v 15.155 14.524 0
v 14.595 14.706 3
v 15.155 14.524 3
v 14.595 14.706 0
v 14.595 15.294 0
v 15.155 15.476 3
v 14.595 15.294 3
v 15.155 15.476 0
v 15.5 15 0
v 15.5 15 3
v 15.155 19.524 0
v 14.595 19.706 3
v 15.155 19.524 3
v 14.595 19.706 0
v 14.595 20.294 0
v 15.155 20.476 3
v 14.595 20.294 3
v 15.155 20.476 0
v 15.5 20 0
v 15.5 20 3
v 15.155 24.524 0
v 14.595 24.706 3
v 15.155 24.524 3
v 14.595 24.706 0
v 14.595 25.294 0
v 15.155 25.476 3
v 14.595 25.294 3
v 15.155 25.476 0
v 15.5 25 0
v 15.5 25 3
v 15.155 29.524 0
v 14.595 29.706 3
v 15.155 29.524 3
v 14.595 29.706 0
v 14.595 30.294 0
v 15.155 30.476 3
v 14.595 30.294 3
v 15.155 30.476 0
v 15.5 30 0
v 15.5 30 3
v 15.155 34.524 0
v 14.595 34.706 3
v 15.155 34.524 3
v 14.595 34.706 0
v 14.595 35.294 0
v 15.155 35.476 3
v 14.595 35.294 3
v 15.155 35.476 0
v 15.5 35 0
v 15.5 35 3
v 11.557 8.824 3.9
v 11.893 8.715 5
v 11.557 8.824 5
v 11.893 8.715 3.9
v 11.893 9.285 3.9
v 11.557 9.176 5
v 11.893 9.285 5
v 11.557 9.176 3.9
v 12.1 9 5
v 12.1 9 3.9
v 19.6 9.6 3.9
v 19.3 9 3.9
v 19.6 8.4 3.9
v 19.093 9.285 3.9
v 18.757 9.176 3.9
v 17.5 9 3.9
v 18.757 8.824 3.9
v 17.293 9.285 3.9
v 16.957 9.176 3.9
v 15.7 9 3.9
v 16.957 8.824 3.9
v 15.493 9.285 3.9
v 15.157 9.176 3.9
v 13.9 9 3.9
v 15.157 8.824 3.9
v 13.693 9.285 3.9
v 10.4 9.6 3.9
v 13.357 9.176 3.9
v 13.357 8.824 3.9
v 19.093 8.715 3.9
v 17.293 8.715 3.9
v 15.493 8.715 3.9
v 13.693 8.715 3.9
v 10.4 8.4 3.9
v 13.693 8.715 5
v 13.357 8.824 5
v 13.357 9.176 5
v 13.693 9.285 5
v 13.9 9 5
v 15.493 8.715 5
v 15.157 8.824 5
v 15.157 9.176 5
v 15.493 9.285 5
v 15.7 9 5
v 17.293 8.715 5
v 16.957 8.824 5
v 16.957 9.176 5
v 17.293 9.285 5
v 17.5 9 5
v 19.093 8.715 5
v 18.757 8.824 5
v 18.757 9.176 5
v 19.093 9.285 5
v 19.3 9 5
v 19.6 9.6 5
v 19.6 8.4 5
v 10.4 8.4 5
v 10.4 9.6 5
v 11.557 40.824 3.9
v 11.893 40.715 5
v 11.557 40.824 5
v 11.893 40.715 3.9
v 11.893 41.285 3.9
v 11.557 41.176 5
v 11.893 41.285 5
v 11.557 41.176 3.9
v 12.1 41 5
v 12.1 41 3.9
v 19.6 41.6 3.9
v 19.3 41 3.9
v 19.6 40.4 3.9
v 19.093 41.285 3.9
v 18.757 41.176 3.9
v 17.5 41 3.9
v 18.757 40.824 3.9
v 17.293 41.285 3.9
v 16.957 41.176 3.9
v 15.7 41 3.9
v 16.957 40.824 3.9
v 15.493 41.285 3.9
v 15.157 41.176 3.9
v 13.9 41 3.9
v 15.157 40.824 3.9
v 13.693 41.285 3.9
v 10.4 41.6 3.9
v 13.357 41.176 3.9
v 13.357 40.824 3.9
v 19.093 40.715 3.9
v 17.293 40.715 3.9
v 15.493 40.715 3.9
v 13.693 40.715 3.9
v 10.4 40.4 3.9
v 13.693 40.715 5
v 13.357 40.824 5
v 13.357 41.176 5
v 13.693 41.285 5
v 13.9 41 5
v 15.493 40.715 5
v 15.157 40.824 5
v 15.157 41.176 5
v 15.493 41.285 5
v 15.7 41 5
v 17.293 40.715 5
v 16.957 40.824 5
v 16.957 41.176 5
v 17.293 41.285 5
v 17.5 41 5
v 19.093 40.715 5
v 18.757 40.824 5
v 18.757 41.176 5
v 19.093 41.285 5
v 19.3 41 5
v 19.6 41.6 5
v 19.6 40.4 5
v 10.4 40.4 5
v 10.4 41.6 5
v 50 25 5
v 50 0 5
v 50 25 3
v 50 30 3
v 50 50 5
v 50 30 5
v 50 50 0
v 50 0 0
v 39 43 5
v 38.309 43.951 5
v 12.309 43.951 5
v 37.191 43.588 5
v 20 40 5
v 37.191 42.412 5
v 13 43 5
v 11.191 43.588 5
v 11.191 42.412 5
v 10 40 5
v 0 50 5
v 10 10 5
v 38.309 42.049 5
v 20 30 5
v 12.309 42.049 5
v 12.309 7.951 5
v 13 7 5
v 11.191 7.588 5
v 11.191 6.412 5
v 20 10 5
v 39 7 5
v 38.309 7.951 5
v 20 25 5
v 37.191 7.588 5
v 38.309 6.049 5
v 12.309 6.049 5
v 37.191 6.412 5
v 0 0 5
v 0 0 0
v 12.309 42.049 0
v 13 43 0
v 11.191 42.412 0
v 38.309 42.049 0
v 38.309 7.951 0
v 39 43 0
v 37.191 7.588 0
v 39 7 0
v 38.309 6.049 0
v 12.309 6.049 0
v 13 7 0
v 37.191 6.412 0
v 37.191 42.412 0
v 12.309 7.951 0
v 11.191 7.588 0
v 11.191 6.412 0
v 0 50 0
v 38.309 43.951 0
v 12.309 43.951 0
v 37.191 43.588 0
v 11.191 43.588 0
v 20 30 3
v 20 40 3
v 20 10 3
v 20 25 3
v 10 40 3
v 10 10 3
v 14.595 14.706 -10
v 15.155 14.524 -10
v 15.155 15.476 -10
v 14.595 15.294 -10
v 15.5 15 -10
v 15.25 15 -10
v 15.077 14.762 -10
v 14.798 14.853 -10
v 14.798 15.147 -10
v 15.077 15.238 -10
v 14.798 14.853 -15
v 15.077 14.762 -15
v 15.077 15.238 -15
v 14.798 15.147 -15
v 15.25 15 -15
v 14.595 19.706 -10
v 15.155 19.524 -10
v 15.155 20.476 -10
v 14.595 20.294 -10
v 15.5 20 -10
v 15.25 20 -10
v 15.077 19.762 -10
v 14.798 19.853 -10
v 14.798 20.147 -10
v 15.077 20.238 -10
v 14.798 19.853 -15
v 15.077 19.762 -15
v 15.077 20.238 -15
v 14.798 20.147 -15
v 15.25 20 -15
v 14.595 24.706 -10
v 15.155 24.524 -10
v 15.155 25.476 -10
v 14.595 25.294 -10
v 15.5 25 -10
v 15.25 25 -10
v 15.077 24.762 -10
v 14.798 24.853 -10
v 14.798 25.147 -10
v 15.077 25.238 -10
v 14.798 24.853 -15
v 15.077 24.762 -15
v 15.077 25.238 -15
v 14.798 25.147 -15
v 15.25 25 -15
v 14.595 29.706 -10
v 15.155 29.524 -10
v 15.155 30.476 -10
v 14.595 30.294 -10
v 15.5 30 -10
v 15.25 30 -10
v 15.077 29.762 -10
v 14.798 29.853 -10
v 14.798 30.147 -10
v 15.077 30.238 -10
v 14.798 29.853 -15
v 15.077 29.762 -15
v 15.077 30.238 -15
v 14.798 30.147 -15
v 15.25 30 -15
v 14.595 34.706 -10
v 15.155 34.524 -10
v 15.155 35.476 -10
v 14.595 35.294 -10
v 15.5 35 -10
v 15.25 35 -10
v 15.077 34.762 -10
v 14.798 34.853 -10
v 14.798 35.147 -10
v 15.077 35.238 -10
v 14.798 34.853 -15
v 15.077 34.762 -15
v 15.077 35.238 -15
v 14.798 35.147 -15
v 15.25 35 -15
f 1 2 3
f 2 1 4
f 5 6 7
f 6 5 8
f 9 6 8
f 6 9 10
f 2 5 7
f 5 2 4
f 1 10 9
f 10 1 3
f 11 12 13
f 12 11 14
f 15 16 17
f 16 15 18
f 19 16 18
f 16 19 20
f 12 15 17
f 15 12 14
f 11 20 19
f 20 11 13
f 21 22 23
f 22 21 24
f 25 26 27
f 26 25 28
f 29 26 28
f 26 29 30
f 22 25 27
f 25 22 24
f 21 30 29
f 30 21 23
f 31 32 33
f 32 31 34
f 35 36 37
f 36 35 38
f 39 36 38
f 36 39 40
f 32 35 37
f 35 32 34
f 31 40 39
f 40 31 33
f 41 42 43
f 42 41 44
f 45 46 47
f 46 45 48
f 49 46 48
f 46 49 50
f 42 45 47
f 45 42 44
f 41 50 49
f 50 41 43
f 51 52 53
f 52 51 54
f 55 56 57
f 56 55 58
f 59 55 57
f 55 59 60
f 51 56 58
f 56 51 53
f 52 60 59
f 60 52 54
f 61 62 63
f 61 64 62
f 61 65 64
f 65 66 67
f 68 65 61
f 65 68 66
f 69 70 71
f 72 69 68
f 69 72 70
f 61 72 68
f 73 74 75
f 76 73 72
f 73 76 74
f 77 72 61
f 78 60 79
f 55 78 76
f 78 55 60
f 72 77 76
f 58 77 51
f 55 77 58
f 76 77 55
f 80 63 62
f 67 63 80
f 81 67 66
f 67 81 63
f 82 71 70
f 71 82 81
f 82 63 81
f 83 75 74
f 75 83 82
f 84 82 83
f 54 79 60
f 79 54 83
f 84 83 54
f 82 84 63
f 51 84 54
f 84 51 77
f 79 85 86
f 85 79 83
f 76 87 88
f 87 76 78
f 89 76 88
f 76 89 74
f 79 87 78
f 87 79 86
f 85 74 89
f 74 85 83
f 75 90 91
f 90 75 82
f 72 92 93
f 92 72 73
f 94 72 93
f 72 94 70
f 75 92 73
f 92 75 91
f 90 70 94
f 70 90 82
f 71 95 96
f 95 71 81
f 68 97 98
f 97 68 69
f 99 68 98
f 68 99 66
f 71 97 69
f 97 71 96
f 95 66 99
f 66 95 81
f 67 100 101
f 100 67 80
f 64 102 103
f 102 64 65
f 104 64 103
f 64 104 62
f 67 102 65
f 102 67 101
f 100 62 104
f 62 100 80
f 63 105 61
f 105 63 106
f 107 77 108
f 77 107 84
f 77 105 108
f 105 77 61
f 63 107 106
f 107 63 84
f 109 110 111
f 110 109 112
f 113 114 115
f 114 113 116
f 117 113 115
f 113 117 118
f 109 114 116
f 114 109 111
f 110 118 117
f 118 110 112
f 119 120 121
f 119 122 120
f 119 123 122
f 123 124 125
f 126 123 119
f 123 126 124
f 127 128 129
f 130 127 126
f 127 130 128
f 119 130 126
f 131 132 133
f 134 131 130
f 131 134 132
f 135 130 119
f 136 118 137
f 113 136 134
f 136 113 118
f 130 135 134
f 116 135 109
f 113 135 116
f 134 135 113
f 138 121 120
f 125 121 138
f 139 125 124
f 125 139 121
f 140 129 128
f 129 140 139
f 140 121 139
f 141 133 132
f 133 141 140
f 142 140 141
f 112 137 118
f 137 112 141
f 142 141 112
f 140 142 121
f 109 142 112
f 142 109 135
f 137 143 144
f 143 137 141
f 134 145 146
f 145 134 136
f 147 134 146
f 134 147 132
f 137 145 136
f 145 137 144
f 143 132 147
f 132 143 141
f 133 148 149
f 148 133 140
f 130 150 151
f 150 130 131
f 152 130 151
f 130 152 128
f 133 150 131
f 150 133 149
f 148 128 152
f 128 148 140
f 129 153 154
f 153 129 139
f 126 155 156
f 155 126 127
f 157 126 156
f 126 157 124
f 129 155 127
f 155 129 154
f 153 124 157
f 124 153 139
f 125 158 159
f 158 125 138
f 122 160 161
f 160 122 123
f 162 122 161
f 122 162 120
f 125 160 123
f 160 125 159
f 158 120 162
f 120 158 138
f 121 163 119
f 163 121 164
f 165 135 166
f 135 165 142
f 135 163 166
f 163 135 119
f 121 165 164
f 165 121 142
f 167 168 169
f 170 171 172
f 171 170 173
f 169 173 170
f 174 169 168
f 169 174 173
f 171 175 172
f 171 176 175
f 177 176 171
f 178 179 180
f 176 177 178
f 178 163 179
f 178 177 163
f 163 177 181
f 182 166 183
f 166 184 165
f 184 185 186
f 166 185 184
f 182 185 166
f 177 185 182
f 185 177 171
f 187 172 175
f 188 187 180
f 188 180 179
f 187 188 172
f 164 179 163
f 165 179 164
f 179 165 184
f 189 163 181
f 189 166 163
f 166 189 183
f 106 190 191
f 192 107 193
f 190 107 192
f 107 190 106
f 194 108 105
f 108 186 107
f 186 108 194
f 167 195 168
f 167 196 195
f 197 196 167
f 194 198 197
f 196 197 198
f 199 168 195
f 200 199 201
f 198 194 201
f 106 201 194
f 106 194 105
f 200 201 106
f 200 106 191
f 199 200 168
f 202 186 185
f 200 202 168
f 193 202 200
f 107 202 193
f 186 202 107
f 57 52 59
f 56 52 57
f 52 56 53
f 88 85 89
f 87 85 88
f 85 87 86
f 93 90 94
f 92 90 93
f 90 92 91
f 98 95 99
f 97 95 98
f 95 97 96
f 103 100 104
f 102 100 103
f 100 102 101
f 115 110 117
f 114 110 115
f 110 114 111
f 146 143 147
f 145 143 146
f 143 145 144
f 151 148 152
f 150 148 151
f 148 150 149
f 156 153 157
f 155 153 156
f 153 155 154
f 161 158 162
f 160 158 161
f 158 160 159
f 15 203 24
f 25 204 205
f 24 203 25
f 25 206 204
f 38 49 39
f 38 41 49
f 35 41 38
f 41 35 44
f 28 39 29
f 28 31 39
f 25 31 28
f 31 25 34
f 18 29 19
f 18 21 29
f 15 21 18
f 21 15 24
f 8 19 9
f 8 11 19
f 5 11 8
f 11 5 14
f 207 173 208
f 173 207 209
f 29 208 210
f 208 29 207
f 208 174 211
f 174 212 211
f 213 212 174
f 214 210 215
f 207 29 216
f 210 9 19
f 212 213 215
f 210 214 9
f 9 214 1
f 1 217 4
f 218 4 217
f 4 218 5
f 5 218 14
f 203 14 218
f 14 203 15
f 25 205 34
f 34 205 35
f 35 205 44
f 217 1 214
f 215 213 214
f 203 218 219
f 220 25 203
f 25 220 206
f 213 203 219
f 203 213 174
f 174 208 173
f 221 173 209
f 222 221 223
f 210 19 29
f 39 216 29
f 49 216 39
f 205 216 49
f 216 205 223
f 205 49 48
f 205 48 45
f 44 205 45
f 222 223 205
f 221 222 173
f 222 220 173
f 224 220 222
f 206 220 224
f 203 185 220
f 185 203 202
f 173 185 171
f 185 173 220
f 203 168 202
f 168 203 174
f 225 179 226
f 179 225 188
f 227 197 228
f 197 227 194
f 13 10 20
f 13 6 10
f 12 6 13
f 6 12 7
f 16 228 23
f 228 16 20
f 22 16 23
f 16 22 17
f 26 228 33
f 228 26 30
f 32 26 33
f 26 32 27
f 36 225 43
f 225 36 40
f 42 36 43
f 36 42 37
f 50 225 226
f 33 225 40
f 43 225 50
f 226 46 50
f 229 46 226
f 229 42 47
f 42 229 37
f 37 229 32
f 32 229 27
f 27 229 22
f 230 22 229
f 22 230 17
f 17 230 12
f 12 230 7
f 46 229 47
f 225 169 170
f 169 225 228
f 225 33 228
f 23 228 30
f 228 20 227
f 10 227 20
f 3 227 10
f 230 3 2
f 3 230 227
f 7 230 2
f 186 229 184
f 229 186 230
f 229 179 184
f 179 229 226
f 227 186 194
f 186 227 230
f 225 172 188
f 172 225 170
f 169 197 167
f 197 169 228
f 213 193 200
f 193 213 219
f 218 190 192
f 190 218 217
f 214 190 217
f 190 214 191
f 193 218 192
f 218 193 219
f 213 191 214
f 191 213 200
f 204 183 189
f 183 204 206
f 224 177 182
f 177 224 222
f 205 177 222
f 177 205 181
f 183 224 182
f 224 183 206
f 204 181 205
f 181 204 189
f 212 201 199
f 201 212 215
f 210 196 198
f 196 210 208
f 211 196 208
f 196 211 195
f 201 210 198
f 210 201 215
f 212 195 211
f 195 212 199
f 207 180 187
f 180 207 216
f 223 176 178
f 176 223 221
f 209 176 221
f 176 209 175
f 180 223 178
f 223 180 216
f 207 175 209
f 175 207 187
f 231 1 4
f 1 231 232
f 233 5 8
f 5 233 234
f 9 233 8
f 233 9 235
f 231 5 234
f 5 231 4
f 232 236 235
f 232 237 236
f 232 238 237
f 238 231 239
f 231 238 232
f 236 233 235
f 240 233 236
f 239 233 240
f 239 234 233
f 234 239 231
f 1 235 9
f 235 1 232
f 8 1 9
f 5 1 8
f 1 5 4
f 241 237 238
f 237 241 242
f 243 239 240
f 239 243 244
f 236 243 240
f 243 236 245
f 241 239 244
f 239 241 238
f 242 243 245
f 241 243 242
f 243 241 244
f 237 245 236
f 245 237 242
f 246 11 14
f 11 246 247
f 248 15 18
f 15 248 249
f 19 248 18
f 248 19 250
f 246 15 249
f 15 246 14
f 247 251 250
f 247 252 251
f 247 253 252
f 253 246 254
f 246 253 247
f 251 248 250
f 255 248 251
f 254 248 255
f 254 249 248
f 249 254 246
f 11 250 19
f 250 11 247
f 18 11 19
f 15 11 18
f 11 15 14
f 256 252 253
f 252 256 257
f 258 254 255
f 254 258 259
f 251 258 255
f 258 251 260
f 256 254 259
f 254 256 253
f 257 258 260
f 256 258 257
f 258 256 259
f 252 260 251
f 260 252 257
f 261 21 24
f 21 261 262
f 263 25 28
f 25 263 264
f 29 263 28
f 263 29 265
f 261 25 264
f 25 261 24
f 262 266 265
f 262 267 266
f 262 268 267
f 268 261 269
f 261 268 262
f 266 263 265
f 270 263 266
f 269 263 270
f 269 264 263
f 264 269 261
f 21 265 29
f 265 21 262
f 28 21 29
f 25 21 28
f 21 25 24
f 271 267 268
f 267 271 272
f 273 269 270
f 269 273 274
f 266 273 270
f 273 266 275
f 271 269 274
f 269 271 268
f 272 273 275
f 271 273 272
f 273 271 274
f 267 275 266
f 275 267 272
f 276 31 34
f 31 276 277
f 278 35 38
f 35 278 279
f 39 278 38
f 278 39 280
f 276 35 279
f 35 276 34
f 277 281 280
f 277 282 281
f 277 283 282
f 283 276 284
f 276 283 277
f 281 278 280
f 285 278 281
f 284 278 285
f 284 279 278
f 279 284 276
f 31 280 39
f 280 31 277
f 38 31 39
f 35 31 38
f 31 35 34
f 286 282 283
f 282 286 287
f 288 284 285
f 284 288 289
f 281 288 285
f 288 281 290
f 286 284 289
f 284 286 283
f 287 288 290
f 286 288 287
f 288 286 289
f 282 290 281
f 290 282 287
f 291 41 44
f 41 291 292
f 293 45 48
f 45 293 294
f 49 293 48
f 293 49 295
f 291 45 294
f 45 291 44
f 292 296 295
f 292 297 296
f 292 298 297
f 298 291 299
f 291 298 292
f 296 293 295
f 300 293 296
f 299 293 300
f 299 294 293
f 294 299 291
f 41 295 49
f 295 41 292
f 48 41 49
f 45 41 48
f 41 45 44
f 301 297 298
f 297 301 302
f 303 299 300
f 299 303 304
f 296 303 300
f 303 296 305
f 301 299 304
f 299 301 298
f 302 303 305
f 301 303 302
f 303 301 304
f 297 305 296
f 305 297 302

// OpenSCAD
// file: lego.scad
/*
 * Modified lego code originally copied from canadaduane:
 * https://github.com/canadaduane/Things/blob/master/Lego/lego.scad
 */
 
// Exterior thickness
lego_thickness=2;
wall_thickness=lego_thickness / 5;

// Knobs are the circles on top of blocks
knob_diameter=lego_thickness - (wall_thickness * 2);
knob_height=lego_thickness * 2  / 3;
knob_spacing=knob_diameter * 3/2;


// The 'positive space' of a lego block
module lego_positive(length) {
  num = ((length - (wall_thickness * 2)) / knob_spacing );
  union()
  {
    cube([length, lego_thickness, lego_thickness]);
    translate([knob_diameter / 2 + wall_thickness,
               knob_diameter / 2 + wall_thickness, 0])
      for (xcount=[0:num-1])
        {
          translate([xcount * knob_spacing, 0, lego_thickness])
            cylinder(r=knob_diameter / 2, h=knob_height);
        }
  }
}
 
// The 'negative space' of a lego block
module lego_negative(length) {
  num = ((length - (wall_thickness * 2)) / knob_spacing ) + 1;
  difference()
    {
      translate([wall_thickness, wall_thickness, -0.1])
        cube([length - wall_thickness * 2,
              lego_thickness - wall_thickness * 2,
              knob_height]);
      for (xcount=[1:num-1])
        translate([xcount * knob_spacing, lego_thickness / 2, -0.1])
          cylinder(r=knob_diameter/4,h=knob_height);
    }
}
// file: rambo.scad
module pogo_pin () {
  color("Yellow") union() {
    cylinder (r=0.5, h=10);
    translate ([0, 0, 10]) cylinder (r=0.25, h=5);
  }
}

module rambo_board() {
  color("Green") difference() {
    cube([30, 40, 1]);
    translate([2, 2, -1]) cylinder (r=1, h=5);
    translate([28, 38, -1]) cylinder (r=1, h=5);
    translate([2, 38, -1]) cylinder (r=1, h=5);
    translate([28, 2, -1]) cylinder (r=1, h=5);
  }
}

module rambo_connector() {
  color("Gray") cube([3, 5, 5]);
}

module rambo_connectors() {
  /* motors */
  translate([2, 2, 0]) rambo_connector();
  translate([2, 10, 0]) rambo_connector();
  translate([2, 18, 0]) rambo_connector();
  translate([2, 26, 0]) rambo_connector();
  translate([2, 34, 0]) rambo_connector();
  /* endstops */
  translate([10, 29, 0]) rambo_connector();
  translate([10, 35, 0]) rambo_connector();
  translate([14, 29, 0]) rambo_connector();
  translate([14, 35, 0]) rambo_connector();
  /* Thermistors */
  translate([12, 10, 0]) rambo_connector();
  translate([15, 10, 0]) rambo_connector();
  /* USB */
  translate([20, 37, 0]) rambo_connector();
  /* Mosfets */
  translate([25, 20, 0]) rambo_connector();
  translate([25, 25, 0]) rambo_connector();
  translate([25, 30, 0]) rambo_connector();
  translate([25, 33, 0]) rambo_connector();
  /* Power */
  translate([25, 2, 0]) rotate([0, 0, 90]) rambo_connector();
  translate([30, 2, 0]) rotate([0, 0, 90]) rambo_connector();
}

module rambo_pins() {
  /* motors */
  translate([5, 5, 0]) pogo_pin();
  translate([5, 10, 0]) pogo_pin();
  translate([5, 15, 0]) pogo_pin();
  translate([5, 20, 0]) pogo_pin();
  translate([5, 25, 0]) pogo_pin();
  translate([5, 30, 0]) pogo_pin();
  translate([5, 35, 0]) pogo_pin();
  /* endstops */
  translate([12, 30, 0]) pogo_pin();
  translate([12, 32.5, 0]) pogo_pin();
  translate([12, 35, 0]) pogo_pin();
  translate([15, 30, 0]) pogo_pin();
  translate([15, 32.5, 0]) pogo_pin();
  translate([15, 35, 0]) pogo_pin();
  /* ISP */
  translate([20, 12.5, 0]) pogo_pin();
  translate([20, 15, 0]) pogo_pin();
  translate([20, 22.5, 0]) pogo_pin();
  translate([20, 25, 0]) pogo_pin();
  /* Power */
  translate([25, 5, 0]) pogo_pin();
  translate([20, 5, 0]) pogo_pin();
  /* Mosfets */
  translate([25, 20, 0]) pogo_pin();
  translate([25, 25, 0]) pogo_pin();
  translate([25, 35, 0]) pogo_pin();
}

module rambo(connectors=1, holes=0, pins=0) {
  if (connectors) {
    union() {
      rambo_board();
      rambo_connectors();
    }
  } else if (holes) {
    difference() {
      rambo_board();
      translate([0, 0, -1]) rambo_pins();
    }
  } else if (pins) {
    union() {
      rambo_board();
      rambo_pins();
    }
  } else {
    rambo_board();
  }
}

rambo(1, 0, 0);
// file: top.scad
use <lego.scad>
use <rambo.scad>

module top_cap() {
  color("Red") union() {
    /* Area for the VRef pogo pins */
    translate([0, 2, 0]) cube([10, 30, 2]);
    /* Lego pins to fit into the holder */
    translate([0, 0, 2])  mirror([0, 0, 1]) lego_positive(10);
    translate([0, 32, 2]) mirror([0, 0, 1]) lego_positive(10);
  }
}

module top_holder() {
  color("OrangeRed") union() {
    difference () {
      /* Holder */
      cube([50, 50, 5]);
      /* Area for the VRef pogo pins */
      translate([10, 10, 3]) cube([10, 30, 5]);
      /* Hole for the cables to go through */
      translate([10, 25, 3]) cube([50, 5, 5]);
      /* VRef pogo pins */
      translate([15, 15, -1]) pogo_pin();
      translate([15, 20, -1]) pogo_pin();
      translate([15, 25, -1]) pogo_pin();
      translate([15, 30, -1]) pogo_pin();
      translate([15, 35, -1]) pogo_pin();
      /* Lego holes for the top_cap to fit into */
      translate([10, 8, 4]) lego_negative(10);
      translate([10, 40, 4]) lego_negative(10);
      /* screw hole */
      translate([12, 7, -1]) cylinder (r=1, h=10);
      translate([12, 43, -1]) cylinder (r=1, h=10);
      translate([38, 7, -1]) cylinder (r=1, h=10);
      translate([38, 43, -1]) cylinder (r=1, h=10);
    }
  }
}

top_holder();
translate([10, 8, 5]) top_cap();
// main file
use <top.scad>
use <rambo.scad>

module top() {
  if ($t < 0.5) {
    top_holder();
    assign (animation = ($t/0.5)) {
      translate([15, 15, animation * 5]) mirror([0, 0, 1]) pogo_pin();
      translate([15, 20, animation * 5]) mirror([0, 0, 1]) pogo_pin();
      translate([15, 25, animation * 5]) mirror([0, 0, 1]) pogo_pin();
      translate([15, 30, animation * 5]) mirror([0, 0, 1]) pogo_pin();
      translate([15, 35, animation * 5]) mirror([0, 0, 1]) pogo_pin();
    }
  } else if ($t < 0.75) {
    top_holder();
    translate([15, 15, 5]) mirror([0, 0, 1]) pogo_pin();
    translate([15, 20, 5]) mirror([0, 0, 1]) pogo_pin();
    translate([15, 25, 5]) mirror([0, 0, 1]) pogo_pin();
    translate([15, 30, 5]) mirror([0, 0, 1]) pogo_pin();
    translate([15, 35, 5]) mirror([0, 0, 1]) pogo_pin();
    assign (animation = (($t-0.5)/0.25))
      translate([10, 8, 15 - animation * 10]) top_cap();
  } else {
    top_holder();
    translate([15, 15, 5]) mirror([0, 0, 1]) pogo_pin();
    translate([15, 20, 5]) mirror([0, 0, 1]) pogo_pin();
    translate([15, 25, 5]) mirror([0, 0, 1]) pogo_pin();
    translate([15, 30, 5]) mirror([0, 0, 1]) pogo_pin();
    translate([15, 35, 5]) mirror([0, 0, 1]) pogo_pin();
    translate([10, 8, 5]) top_cap();
  }
}

top();
